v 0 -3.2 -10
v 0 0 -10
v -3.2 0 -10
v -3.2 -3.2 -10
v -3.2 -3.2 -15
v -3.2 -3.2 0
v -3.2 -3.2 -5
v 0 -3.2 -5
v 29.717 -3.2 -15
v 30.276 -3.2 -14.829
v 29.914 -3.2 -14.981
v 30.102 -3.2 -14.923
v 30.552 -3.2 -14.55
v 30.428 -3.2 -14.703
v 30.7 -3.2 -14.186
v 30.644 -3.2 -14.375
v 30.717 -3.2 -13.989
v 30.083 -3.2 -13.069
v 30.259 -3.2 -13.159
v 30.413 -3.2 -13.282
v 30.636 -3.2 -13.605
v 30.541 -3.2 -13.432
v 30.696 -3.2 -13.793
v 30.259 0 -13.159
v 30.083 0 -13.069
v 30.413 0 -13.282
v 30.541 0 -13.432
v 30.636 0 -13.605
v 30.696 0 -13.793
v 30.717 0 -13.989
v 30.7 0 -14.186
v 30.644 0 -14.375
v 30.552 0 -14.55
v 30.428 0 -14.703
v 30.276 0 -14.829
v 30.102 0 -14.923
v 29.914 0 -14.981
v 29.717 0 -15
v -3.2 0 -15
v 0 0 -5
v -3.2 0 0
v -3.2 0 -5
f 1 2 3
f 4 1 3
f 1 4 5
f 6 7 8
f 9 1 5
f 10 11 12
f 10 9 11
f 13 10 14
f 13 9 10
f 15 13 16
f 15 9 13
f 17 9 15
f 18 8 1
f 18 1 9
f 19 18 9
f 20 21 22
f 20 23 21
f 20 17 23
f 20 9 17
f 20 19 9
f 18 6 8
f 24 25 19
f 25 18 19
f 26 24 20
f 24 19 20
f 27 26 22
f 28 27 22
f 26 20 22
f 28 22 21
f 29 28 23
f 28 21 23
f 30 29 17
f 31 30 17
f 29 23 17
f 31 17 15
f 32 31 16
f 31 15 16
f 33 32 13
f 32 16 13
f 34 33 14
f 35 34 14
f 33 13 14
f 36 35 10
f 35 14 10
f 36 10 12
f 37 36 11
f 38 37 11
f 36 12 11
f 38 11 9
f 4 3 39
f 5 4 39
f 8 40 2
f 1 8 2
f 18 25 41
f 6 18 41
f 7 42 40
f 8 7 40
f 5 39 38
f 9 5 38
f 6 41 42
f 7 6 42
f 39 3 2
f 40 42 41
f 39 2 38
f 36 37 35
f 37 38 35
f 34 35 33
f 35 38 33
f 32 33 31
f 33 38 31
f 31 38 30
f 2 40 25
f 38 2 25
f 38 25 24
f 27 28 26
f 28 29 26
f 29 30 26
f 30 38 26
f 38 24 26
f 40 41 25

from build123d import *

# Parameters (mm, degrees)
F1_DEPTH = 3.2
F2_R     = 1


with BuildPart() as f1:
    # F0 (on Front) → F1 (new body)
    with BuildSketch(Plane.XZ):
        Polygon((35, -15), (-3.2, 0), (-3.2, -5), (0, -5), (0, -10), (-3.2, -10), (-3.2, -15), (0, -15), align=None)
    extrude(amount=F1_DEPTH)

    # F2
    f2_edges = [f1.edges().sort_by_distance(p)[0] for p in [
        (35, -1.6, -15),
    ]]
    fillet(f2_edges, radius=F2_R)


solid = f1.part
